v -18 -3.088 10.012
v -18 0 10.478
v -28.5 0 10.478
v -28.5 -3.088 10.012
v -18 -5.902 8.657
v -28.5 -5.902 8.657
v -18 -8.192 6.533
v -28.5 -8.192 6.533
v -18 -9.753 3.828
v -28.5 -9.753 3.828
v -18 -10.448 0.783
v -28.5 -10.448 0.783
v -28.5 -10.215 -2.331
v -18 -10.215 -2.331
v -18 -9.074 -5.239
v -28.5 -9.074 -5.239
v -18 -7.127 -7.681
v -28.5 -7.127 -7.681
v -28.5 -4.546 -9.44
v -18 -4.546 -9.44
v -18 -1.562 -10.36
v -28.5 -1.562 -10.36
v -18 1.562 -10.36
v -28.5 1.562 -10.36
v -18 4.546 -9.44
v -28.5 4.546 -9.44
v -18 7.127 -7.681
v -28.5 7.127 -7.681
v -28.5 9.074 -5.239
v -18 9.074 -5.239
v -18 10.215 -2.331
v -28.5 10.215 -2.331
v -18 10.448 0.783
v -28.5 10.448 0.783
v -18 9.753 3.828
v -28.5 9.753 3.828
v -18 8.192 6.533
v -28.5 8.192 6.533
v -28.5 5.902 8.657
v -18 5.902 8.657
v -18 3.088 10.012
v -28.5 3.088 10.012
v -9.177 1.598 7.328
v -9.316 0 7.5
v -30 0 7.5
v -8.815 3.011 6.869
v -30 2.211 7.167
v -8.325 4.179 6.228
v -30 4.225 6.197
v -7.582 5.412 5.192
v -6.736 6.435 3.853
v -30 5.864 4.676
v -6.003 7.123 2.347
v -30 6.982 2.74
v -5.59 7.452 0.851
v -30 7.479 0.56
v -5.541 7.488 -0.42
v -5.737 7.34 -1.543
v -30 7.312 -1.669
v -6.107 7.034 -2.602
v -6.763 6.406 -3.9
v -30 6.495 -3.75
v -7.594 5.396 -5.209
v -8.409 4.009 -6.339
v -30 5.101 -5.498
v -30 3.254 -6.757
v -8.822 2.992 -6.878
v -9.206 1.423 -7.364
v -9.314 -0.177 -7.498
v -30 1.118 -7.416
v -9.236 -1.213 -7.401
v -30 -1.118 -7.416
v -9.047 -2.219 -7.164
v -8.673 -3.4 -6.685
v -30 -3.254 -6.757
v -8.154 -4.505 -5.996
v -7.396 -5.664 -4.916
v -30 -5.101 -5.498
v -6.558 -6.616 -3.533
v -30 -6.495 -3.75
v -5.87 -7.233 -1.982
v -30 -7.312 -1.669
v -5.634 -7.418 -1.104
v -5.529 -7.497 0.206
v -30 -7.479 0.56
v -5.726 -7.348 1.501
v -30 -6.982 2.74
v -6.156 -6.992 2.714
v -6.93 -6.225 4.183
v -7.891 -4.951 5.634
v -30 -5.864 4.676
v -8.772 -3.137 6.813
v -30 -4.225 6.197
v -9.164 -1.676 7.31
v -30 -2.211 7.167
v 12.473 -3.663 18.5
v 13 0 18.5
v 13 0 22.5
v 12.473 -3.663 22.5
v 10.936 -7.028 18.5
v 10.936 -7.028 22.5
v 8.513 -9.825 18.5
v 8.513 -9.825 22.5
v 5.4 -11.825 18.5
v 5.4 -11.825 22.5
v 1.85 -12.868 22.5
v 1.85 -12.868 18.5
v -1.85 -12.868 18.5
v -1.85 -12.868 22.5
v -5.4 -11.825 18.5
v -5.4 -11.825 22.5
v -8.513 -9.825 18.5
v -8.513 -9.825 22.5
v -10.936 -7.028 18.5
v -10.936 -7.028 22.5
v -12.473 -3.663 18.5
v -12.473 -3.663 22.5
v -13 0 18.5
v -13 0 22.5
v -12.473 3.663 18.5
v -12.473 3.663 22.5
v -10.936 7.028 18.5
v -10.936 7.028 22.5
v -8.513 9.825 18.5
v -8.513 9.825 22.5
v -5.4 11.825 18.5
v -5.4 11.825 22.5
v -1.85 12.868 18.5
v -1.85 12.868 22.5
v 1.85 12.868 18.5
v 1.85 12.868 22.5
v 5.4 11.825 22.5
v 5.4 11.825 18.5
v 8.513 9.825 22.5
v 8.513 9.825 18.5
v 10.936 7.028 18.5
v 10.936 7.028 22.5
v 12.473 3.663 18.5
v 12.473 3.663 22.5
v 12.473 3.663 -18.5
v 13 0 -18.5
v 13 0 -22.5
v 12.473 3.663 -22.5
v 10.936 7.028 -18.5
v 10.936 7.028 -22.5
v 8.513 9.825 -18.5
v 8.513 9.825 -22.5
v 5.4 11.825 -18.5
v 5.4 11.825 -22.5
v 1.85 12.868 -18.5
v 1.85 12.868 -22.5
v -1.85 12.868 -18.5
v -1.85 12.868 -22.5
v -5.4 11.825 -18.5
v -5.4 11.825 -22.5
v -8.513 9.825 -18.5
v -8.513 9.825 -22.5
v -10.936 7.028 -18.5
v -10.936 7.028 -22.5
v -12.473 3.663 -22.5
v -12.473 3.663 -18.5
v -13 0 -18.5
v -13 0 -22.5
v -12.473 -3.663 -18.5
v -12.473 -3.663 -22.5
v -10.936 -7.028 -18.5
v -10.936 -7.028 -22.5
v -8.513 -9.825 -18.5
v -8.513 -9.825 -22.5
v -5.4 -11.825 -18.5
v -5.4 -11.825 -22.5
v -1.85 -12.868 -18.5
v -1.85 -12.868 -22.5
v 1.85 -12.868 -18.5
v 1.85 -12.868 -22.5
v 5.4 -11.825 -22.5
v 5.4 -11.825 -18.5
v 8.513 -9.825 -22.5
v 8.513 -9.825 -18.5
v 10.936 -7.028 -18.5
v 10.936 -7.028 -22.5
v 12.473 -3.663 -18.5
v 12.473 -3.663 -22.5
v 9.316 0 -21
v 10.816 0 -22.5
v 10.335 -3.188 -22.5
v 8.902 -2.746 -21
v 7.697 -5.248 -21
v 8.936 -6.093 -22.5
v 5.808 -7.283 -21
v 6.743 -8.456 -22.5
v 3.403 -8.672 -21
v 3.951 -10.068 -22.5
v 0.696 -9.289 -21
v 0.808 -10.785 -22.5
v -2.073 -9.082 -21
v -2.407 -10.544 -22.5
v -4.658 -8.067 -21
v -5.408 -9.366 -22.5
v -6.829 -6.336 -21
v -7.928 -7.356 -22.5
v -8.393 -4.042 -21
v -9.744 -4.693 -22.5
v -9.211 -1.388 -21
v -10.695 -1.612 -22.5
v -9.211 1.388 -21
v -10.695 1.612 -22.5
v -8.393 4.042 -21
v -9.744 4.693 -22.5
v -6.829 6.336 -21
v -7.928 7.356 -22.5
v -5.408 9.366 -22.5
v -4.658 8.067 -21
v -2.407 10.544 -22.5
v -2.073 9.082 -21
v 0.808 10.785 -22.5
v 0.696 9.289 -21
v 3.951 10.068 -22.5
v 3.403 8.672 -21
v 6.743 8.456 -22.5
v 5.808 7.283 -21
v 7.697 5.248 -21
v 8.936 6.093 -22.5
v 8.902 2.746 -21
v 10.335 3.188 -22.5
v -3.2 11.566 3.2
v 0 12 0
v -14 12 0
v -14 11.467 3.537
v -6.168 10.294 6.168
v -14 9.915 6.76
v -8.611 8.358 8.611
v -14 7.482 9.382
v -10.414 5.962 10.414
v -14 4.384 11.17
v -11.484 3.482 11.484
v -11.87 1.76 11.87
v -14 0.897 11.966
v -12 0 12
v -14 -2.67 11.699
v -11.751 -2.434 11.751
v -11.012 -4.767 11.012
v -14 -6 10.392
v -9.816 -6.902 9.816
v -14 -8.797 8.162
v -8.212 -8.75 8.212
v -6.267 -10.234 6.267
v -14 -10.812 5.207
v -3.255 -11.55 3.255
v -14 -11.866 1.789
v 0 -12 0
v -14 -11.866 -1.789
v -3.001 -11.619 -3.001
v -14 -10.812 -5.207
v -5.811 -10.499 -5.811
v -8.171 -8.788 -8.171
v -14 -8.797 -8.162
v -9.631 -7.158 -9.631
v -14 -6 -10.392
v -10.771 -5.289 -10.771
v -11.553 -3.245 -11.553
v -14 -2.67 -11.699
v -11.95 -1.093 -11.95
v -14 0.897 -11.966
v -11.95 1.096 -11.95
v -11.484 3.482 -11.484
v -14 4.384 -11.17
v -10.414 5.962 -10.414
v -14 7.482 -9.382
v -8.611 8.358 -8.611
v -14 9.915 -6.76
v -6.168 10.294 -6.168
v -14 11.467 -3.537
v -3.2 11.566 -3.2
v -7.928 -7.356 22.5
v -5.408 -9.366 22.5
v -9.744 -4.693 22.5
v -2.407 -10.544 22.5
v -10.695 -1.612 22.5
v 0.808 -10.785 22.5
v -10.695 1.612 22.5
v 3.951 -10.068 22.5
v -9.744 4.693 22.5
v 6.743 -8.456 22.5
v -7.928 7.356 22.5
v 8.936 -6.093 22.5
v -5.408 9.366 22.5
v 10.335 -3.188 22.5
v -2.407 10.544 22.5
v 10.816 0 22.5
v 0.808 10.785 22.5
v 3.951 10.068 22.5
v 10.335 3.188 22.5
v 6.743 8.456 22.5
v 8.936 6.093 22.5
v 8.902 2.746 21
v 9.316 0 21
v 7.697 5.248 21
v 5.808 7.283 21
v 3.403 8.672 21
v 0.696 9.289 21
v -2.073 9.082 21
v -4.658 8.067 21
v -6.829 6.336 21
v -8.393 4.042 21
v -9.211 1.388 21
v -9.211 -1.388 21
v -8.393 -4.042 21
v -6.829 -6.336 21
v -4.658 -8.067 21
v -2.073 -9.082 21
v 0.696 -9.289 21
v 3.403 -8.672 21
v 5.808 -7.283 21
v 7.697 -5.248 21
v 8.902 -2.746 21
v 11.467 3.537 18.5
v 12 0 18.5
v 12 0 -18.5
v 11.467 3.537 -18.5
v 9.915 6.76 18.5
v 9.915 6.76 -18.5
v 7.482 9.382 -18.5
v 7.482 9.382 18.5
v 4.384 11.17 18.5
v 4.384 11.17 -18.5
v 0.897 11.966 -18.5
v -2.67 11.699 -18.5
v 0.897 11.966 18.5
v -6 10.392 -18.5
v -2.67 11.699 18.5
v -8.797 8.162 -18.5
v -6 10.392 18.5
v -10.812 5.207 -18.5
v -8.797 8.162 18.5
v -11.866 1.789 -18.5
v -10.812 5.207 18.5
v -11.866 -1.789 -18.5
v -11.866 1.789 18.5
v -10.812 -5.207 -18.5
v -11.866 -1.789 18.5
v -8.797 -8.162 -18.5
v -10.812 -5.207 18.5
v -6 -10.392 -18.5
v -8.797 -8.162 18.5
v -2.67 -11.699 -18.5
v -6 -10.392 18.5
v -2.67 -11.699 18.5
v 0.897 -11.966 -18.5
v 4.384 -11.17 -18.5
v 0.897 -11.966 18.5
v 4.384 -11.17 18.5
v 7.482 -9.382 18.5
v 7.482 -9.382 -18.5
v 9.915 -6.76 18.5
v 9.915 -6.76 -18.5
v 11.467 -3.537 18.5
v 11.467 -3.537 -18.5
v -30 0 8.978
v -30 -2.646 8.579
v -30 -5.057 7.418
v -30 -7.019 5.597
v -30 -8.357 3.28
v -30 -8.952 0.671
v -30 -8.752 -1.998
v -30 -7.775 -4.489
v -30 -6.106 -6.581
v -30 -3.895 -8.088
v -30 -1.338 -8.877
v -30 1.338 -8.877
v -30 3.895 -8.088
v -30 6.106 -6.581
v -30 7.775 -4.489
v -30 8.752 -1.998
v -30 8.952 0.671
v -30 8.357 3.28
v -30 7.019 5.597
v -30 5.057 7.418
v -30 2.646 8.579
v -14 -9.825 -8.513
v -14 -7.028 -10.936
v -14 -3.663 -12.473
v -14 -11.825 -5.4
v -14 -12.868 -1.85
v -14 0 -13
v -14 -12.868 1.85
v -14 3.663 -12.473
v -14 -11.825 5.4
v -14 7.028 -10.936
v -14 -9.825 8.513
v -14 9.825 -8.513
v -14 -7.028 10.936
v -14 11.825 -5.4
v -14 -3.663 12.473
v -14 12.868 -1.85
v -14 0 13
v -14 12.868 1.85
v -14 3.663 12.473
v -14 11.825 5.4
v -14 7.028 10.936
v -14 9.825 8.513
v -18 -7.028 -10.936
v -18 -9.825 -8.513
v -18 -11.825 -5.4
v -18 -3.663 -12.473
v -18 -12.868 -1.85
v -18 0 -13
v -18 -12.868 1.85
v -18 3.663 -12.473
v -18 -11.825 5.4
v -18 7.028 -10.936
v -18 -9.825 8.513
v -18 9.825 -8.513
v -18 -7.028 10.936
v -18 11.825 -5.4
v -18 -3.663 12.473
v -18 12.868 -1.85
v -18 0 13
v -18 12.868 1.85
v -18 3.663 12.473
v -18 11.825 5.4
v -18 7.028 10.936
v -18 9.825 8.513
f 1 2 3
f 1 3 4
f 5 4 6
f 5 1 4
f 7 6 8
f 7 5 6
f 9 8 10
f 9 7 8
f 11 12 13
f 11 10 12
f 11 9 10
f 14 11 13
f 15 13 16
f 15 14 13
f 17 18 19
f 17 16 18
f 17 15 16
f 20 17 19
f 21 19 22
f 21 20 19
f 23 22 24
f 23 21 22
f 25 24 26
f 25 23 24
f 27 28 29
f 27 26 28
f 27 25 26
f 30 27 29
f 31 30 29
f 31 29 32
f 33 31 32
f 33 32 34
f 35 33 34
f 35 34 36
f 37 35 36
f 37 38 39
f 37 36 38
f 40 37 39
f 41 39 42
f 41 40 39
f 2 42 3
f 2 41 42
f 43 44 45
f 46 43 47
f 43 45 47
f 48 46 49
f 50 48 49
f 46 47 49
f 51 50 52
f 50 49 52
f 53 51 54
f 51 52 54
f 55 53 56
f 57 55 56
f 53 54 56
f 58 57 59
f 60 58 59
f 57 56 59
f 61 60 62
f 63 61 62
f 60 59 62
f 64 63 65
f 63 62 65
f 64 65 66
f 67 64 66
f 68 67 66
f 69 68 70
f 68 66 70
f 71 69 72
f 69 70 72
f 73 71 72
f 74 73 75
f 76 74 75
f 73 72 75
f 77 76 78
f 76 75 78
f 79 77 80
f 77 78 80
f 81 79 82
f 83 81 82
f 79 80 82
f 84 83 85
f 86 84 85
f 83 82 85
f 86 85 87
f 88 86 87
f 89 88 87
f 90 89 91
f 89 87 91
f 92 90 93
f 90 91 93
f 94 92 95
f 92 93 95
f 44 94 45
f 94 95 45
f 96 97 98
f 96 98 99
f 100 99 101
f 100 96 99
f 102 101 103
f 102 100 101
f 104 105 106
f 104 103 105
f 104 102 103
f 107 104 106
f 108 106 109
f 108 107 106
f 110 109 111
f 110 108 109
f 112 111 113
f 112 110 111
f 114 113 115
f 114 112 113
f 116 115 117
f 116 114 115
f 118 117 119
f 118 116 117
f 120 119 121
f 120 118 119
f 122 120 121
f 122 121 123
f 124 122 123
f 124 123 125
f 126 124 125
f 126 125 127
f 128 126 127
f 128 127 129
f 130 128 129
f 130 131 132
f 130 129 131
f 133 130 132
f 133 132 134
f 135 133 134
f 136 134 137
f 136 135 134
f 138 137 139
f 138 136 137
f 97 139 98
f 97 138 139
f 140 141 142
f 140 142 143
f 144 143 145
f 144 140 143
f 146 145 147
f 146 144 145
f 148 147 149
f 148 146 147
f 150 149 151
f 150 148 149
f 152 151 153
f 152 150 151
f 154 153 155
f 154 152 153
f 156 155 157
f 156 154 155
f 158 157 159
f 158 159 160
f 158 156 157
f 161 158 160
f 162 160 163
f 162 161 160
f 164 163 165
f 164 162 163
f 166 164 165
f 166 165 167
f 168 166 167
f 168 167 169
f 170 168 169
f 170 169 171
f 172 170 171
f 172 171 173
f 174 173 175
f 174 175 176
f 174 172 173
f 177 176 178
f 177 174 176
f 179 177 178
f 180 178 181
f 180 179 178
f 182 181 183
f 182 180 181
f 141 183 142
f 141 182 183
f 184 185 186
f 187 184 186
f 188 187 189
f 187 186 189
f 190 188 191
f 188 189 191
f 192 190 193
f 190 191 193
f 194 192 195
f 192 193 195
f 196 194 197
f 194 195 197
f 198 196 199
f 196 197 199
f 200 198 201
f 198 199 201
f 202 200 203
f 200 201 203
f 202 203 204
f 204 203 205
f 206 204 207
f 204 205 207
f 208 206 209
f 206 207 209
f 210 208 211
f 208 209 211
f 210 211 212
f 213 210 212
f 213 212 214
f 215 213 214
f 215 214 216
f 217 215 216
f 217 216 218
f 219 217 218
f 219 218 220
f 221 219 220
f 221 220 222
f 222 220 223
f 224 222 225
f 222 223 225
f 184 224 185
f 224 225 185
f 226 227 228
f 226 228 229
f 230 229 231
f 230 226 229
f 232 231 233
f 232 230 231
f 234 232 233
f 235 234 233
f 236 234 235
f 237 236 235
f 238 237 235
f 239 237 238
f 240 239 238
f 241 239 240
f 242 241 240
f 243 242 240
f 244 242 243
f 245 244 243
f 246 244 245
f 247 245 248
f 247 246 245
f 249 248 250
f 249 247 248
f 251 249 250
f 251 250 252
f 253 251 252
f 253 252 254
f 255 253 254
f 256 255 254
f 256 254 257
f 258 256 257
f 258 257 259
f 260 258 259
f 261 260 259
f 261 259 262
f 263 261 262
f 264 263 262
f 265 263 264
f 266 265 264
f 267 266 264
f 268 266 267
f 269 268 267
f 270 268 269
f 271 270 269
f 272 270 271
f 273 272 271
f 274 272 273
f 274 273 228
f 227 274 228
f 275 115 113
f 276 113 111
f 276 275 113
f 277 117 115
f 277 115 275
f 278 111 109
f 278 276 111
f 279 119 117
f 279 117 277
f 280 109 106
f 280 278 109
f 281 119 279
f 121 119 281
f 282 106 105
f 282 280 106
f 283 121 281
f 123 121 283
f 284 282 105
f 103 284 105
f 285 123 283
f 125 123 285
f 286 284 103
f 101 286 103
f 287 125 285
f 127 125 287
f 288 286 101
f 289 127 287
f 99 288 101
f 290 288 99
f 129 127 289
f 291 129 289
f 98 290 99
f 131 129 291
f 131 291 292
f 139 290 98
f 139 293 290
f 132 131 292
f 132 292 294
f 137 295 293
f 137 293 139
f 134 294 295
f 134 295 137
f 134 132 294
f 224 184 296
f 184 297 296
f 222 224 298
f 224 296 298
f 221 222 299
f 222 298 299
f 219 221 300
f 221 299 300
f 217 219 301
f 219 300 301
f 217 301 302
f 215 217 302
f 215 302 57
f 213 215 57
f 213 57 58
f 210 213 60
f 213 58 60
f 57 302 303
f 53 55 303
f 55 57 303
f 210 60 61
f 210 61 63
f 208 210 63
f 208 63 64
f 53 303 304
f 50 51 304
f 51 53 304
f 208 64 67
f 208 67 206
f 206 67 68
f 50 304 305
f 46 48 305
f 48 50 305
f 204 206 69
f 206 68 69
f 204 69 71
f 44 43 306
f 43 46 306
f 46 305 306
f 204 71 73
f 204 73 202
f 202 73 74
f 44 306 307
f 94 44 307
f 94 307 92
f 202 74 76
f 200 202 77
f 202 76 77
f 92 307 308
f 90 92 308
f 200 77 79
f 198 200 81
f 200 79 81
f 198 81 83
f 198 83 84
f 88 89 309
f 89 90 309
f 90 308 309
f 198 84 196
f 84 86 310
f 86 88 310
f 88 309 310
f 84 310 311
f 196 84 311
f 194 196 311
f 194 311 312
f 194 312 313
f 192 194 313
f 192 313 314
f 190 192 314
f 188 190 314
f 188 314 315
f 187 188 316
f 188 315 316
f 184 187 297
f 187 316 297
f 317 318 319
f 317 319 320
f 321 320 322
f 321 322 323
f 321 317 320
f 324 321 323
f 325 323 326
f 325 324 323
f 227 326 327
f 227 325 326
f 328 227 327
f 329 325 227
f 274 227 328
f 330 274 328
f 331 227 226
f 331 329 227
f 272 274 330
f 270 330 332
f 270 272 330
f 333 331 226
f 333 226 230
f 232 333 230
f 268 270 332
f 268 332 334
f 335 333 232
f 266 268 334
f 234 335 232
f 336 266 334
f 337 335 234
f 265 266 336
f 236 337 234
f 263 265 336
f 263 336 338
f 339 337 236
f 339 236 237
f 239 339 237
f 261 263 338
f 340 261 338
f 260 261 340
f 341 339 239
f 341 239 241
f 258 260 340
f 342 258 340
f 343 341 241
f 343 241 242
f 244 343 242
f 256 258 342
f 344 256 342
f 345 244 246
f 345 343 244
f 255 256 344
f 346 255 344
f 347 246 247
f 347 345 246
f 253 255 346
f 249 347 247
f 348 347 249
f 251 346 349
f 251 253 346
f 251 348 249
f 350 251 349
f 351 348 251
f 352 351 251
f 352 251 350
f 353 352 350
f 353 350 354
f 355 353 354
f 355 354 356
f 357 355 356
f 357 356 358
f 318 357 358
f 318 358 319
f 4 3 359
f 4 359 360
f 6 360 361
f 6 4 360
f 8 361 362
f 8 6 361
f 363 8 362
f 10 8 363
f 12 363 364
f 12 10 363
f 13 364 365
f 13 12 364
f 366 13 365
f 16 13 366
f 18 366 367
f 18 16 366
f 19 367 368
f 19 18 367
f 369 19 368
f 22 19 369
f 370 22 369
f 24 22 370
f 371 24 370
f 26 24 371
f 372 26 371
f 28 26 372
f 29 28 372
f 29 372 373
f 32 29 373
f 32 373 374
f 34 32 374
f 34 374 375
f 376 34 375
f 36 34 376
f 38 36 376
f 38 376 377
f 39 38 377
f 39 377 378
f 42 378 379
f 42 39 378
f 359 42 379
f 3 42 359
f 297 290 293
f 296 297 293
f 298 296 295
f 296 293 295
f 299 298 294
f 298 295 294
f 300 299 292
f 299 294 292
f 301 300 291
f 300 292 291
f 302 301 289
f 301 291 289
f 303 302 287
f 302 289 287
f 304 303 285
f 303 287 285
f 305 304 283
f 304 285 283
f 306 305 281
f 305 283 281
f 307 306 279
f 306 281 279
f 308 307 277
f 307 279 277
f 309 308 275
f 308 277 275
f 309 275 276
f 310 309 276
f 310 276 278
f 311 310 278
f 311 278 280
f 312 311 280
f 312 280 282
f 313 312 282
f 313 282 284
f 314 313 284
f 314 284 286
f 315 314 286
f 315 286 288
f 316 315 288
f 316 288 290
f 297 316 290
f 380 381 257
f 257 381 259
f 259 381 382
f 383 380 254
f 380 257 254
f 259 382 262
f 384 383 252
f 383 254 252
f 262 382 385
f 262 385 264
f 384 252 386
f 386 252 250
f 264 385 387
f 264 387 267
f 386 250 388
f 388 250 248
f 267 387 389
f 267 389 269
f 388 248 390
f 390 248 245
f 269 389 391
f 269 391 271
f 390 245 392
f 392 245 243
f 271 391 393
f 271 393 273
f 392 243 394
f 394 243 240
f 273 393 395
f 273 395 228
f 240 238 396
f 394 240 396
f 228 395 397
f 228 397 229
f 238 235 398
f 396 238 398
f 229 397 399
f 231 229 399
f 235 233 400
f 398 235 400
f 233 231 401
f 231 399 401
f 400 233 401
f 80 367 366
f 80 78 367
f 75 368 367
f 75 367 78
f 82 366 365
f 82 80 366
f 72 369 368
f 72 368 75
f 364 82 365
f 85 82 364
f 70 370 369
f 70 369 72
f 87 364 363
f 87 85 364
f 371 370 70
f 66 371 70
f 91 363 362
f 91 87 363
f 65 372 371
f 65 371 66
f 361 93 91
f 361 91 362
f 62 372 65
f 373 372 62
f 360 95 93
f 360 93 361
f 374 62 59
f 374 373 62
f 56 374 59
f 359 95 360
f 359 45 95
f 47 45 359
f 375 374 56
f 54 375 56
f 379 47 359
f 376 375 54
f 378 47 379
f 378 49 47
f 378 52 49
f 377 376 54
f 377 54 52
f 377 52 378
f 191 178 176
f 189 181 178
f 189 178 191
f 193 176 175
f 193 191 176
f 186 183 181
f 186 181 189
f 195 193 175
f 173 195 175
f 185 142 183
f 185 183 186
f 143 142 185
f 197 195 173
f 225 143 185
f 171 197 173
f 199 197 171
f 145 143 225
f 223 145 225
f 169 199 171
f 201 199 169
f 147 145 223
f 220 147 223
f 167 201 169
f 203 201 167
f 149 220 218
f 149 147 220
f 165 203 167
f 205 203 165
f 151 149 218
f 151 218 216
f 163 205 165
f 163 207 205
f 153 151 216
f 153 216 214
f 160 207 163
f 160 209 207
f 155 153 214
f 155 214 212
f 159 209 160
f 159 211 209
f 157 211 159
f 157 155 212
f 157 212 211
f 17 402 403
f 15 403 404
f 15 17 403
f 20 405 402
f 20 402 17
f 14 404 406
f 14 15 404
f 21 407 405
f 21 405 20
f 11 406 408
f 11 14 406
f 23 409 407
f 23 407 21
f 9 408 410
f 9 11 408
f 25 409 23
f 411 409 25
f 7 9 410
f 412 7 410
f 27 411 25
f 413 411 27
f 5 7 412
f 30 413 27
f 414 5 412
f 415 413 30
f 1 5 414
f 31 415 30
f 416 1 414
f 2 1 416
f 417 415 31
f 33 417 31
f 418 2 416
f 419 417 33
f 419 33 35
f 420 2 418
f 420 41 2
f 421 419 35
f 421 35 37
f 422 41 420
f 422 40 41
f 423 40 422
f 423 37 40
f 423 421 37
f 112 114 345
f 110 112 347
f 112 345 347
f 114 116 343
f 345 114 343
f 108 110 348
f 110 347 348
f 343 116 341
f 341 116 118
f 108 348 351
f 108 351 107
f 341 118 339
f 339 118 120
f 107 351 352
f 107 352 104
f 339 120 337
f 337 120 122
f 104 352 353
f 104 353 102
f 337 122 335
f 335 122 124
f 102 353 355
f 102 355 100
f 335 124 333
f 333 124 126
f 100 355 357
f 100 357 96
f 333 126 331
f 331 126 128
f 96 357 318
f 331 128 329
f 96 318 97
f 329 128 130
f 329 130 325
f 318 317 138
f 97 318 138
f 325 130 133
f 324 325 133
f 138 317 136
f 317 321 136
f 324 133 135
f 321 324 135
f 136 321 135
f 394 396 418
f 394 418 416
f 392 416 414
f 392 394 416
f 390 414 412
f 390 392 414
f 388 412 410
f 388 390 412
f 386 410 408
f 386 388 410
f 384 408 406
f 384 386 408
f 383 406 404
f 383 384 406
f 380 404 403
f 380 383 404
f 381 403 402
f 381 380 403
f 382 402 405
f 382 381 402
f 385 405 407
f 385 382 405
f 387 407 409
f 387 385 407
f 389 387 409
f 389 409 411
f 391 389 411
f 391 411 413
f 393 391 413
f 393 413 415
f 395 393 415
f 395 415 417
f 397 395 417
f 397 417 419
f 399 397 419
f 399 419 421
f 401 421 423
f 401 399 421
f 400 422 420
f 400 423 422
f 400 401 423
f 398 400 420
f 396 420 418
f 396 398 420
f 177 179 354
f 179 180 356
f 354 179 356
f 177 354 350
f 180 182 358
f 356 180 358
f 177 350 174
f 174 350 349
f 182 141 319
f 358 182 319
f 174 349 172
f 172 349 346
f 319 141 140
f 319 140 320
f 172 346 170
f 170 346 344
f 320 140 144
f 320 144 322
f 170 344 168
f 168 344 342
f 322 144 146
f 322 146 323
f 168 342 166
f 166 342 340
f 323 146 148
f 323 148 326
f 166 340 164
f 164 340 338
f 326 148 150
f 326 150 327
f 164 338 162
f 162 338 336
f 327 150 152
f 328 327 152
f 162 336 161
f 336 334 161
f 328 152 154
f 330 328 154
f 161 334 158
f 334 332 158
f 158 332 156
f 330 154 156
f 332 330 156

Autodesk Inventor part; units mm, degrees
ref_plane "YZ Plane" through (0, 0, 0) normal (1, 0, 0) x (0, 1, 0)
ref_plane "XZ Plane" through (0, 0, 0) normal (0, 1, 0) x (-1, 0, 0)
ref_plane "XY Plane" through (0, 0, 0) normal (0, 0, 1) x (1, 0, 0)
sketch "Эскиз1" plane through (0, 0, 0) normal (0, 0, 1) x (1, 0, 0)
  circle A0 centre (0, 0) radius 12
  dimension "d0" = 24
extrude "Выдавливание1" add sketch "Эскиз1" along normal mid plane 37
sketch "Эскиз7" plane through (0, 0, 18.5) normal (0, 0, 1) x (1, 0, 0)
  circle A0 centre (0, 0) radius 13
  dimension "d27" = 26
extrude "Выдавливание7" add sketch "Эскиз7" along normal blind 4
mirror "Зеркальное отражение1" about plane through (0, 0, 0) normal (0, 0, 1) of "Выдавливание7"
sketch "Эскиз8" plane through (0, 0, 0) normal (1, 0, 0) x (0, 1, 0)
  circle A0 centre (0, 0) radius 12
  dimension "d30" = 24
extrude "Выдавливание8" add sketch "Эскиз8" against normal blind 14
sketch "Эскиз9" plane through (-14, 0, 0) normal (-1, 0, 0) x (0, 0, 1)
  circle A0 centre (0, 0) radius 13
  dimension "d33" = 26
extrude "Выдавливание9" add sketch "Эскиз9" along normal blind 4
sketch "Эскиз10" plane through (-18, 0, 0) normal (-1, 0, 0) x (0, 0, 1)
  circle A0 centre (0, 0) radius 10.4775
  dimension "d36" = 20.955
extrude "Выдавливание10" add sketch "Эскиз10" along normal blind 12
thread "Резьба1" size "G20.955x1.814" designation "G 1/2" class "A" standard "ISO Pipe Threads" length 11
sketch "Эскиз11" plane through (0, 0, 22.5) normal (0, 0, 1) x (1, 0, 0)
  circle A0 centre (0, 0) radius 9.3155
  dimension "d41" = 18.631
extrude "Выдавливание11" cut sketch "Эскиз11" against normal through all
thread "Резьба2" size "G20.955x1.814" designation "G 1/2" standard "ISO Pipe Threads" length 12
thread "Резьба3" size "G20.955x1.814" designation "G 1/2" standard "ISO Pipe Threads" length 12
sketch "Эскиз12" plane through (-30, 0, 0) normal (-1, 0, 0) x (0, 0, 1)
  circle A0 centre (0, 0) radius 7.5
  dimension "d48" = 15
extrude "Выдавливание12" cut sketch "Эскиз12" against normal up to next
chamfer "Фаска5" distance 1.5 angle 45 1 edges at (-30, 0, -10.4775)
chamfer "Фаска6" distance 1.5 angle 45 1 edges at (-9.3155, 0, -22.5)
chamfer "Фаска7" distance 1.5 angle 45 1 edges at (-9.3155, 0, 22.5)
properties part number "Инж_граф_2"
